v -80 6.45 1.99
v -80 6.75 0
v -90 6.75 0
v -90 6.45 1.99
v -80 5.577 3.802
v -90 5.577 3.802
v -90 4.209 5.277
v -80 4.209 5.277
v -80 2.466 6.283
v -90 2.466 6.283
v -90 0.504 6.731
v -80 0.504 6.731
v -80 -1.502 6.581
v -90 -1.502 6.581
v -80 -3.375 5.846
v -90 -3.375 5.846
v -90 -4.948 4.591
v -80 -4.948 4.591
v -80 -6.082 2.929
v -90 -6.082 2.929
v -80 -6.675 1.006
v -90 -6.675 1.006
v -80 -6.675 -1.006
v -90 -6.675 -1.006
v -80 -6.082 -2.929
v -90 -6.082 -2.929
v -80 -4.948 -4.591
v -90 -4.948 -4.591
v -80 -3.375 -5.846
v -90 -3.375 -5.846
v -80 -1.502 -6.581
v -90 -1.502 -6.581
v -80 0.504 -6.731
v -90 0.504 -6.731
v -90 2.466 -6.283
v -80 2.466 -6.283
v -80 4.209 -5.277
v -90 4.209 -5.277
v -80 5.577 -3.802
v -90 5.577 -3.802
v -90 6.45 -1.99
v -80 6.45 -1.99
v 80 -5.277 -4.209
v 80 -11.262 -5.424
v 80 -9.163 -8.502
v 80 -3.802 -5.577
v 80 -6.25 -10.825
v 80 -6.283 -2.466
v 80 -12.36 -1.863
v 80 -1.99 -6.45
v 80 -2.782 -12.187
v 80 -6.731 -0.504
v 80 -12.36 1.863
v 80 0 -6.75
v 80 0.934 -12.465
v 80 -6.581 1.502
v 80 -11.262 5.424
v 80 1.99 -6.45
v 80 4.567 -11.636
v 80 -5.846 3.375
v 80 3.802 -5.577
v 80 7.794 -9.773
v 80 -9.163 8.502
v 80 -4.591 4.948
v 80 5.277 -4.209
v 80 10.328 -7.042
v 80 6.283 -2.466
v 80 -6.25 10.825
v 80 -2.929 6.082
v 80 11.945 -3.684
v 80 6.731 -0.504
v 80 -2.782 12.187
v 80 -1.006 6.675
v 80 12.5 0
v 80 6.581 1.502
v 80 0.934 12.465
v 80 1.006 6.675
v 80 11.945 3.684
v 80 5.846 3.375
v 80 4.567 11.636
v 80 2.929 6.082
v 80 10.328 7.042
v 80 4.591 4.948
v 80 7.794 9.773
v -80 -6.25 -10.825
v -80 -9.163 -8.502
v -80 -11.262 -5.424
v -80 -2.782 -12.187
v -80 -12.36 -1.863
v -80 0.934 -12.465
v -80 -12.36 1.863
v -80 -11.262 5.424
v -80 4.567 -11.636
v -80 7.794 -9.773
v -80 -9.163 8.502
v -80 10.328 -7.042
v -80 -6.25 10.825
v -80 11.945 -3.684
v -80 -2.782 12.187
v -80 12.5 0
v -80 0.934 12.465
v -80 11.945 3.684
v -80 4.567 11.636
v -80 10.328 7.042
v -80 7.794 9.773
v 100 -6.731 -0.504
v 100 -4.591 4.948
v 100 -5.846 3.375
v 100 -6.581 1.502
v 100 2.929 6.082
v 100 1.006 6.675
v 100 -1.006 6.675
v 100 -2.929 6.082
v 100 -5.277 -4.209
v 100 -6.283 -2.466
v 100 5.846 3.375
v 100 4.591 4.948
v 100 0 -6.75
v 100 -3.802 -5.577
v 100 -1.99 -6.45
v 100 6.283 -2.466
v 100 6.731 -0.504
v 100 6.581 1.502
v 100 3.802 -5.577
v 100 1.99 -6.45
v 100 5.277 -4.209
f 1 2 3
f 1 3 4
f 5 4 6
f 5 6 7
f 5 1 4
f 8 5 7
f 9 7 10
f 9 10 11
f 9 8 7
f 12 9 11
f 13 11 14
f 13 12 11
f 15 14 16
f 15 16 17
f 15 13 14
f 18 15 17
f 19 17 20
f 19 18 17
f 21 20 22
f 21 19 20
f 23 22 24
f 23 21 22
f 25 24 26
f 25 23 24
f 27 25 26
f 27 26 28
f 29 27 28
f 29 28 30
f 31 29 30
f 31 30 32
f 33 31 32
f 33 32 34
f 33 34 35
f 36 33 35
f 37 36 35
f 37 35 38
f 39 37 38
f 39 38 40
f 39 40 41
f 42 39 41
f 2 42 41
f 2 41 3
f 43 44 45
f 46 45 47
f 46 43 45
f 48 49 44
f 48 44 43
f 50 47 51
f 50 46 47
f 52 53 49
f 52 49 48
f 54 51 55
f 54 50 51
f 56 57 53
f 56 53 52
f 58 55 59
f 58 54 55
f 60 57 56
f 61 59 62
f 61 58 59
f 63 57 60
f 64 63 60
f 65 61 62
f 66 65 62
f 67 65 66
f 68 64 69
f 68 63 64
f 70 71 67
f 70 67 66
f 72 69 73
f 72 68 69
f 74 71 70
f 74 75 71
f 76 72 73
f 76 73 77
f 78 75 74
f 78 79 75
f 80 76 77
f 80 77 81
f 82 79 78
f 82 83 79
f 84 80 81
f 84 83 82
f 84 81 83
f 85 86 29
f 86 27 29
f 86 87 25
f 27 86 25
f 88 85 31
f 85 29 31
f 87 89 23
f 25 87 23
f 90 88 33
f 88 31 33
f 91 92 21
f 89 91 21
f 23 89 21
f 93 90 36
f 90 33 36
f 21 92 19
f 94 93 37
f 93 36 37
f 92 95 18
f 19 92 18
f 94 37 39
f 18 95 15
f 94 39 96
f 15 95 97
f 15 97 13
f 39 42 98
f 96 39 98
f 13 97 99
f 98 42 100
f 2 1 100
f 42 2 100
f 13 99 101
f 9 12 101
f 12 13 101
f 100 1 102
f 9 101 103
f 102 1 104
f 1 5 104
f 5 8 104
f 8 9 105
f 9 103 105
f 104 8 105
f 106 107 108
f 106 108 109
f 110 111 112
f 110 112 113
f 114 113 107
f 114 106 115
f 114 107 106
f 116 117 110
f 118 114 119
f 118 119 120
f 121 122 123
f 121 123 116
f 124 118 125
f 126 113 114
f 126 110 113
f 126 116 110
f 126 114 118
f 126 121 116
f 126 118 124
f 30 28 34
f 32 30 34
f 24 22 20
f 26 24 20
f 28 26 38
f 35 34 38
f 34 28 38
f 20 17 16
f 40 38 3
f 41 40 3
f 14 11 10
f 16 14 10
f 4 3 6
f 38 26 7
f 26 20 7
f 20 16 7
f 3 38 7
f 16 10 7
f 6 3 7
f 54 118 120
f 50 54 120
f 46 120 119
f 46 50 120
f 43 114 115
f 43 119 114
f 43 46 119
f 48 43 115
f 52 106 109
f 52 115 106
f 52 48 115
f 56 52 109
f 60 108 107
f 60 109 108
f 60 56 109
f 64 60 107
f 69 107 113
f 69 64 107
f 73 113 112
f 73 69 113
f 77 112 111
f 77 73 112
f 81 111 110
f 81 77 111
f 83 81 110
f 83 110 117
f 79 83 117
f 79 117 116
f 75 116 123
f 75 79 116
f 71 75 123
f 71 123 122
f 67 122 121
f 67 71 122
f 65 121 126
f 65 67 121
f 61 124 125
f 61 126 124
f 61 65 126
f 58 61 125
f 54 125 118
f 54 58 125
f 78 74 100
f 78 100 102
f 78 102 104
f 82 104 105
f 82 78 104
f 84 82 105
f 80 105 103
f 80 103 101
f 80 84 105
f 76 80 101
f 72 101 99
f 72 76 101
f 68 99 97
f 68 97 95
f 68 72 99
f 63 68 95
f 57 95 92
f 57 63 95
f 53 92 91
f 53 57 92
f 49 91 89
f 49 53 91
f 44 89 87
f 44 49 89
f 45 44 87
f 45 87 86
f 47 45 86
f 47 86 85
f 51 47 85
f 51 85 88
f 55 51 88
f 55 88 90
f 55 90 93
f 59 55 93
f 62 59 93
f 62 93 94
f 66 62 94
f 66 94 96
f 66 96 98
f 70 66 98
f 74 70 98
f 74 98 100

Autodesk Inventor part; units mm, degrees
ref_plane "YZ Plane" through (0, 0, 0) normal (1, 0, 0) x (0, 1, 0)
ref_plane "XZ Plane" through (0, 0, 0) normal (0, 1, 0) x (-1, 0, 0)
ref_plane "XY Plane" through (0, 0, 0) normal (0, 0, 1) x (1, 0, 0)
sketch "Boceto1" plane through (0, 0, 0) normal (1, 0, 0) x (0, 1, 0)
  circle A0 centre (0, 0) radius 12.5
  circle A1 centre (0, 0) radius 6.75
  dimension "d0" = 25
  dimension "d1" = 13.5
extrude "Extrusión1" add sketch "Boceto1" against normal blind 90 contours A1
extrude "Extrusión2" add sketch "Boceto1" along normal mid plane 160
sketch "Boceto2" plane through (0, 0, 0) normal (1, 0, 0) x (0, 0, -1)
  circle A0 centre (0, 0) radius 6.75
  dimension "d6" = 13.5
extrude "Extrusión3" add sketch "Boceto2" along normal blind 100
properties part number "eje" material "Acero, no aleado"
